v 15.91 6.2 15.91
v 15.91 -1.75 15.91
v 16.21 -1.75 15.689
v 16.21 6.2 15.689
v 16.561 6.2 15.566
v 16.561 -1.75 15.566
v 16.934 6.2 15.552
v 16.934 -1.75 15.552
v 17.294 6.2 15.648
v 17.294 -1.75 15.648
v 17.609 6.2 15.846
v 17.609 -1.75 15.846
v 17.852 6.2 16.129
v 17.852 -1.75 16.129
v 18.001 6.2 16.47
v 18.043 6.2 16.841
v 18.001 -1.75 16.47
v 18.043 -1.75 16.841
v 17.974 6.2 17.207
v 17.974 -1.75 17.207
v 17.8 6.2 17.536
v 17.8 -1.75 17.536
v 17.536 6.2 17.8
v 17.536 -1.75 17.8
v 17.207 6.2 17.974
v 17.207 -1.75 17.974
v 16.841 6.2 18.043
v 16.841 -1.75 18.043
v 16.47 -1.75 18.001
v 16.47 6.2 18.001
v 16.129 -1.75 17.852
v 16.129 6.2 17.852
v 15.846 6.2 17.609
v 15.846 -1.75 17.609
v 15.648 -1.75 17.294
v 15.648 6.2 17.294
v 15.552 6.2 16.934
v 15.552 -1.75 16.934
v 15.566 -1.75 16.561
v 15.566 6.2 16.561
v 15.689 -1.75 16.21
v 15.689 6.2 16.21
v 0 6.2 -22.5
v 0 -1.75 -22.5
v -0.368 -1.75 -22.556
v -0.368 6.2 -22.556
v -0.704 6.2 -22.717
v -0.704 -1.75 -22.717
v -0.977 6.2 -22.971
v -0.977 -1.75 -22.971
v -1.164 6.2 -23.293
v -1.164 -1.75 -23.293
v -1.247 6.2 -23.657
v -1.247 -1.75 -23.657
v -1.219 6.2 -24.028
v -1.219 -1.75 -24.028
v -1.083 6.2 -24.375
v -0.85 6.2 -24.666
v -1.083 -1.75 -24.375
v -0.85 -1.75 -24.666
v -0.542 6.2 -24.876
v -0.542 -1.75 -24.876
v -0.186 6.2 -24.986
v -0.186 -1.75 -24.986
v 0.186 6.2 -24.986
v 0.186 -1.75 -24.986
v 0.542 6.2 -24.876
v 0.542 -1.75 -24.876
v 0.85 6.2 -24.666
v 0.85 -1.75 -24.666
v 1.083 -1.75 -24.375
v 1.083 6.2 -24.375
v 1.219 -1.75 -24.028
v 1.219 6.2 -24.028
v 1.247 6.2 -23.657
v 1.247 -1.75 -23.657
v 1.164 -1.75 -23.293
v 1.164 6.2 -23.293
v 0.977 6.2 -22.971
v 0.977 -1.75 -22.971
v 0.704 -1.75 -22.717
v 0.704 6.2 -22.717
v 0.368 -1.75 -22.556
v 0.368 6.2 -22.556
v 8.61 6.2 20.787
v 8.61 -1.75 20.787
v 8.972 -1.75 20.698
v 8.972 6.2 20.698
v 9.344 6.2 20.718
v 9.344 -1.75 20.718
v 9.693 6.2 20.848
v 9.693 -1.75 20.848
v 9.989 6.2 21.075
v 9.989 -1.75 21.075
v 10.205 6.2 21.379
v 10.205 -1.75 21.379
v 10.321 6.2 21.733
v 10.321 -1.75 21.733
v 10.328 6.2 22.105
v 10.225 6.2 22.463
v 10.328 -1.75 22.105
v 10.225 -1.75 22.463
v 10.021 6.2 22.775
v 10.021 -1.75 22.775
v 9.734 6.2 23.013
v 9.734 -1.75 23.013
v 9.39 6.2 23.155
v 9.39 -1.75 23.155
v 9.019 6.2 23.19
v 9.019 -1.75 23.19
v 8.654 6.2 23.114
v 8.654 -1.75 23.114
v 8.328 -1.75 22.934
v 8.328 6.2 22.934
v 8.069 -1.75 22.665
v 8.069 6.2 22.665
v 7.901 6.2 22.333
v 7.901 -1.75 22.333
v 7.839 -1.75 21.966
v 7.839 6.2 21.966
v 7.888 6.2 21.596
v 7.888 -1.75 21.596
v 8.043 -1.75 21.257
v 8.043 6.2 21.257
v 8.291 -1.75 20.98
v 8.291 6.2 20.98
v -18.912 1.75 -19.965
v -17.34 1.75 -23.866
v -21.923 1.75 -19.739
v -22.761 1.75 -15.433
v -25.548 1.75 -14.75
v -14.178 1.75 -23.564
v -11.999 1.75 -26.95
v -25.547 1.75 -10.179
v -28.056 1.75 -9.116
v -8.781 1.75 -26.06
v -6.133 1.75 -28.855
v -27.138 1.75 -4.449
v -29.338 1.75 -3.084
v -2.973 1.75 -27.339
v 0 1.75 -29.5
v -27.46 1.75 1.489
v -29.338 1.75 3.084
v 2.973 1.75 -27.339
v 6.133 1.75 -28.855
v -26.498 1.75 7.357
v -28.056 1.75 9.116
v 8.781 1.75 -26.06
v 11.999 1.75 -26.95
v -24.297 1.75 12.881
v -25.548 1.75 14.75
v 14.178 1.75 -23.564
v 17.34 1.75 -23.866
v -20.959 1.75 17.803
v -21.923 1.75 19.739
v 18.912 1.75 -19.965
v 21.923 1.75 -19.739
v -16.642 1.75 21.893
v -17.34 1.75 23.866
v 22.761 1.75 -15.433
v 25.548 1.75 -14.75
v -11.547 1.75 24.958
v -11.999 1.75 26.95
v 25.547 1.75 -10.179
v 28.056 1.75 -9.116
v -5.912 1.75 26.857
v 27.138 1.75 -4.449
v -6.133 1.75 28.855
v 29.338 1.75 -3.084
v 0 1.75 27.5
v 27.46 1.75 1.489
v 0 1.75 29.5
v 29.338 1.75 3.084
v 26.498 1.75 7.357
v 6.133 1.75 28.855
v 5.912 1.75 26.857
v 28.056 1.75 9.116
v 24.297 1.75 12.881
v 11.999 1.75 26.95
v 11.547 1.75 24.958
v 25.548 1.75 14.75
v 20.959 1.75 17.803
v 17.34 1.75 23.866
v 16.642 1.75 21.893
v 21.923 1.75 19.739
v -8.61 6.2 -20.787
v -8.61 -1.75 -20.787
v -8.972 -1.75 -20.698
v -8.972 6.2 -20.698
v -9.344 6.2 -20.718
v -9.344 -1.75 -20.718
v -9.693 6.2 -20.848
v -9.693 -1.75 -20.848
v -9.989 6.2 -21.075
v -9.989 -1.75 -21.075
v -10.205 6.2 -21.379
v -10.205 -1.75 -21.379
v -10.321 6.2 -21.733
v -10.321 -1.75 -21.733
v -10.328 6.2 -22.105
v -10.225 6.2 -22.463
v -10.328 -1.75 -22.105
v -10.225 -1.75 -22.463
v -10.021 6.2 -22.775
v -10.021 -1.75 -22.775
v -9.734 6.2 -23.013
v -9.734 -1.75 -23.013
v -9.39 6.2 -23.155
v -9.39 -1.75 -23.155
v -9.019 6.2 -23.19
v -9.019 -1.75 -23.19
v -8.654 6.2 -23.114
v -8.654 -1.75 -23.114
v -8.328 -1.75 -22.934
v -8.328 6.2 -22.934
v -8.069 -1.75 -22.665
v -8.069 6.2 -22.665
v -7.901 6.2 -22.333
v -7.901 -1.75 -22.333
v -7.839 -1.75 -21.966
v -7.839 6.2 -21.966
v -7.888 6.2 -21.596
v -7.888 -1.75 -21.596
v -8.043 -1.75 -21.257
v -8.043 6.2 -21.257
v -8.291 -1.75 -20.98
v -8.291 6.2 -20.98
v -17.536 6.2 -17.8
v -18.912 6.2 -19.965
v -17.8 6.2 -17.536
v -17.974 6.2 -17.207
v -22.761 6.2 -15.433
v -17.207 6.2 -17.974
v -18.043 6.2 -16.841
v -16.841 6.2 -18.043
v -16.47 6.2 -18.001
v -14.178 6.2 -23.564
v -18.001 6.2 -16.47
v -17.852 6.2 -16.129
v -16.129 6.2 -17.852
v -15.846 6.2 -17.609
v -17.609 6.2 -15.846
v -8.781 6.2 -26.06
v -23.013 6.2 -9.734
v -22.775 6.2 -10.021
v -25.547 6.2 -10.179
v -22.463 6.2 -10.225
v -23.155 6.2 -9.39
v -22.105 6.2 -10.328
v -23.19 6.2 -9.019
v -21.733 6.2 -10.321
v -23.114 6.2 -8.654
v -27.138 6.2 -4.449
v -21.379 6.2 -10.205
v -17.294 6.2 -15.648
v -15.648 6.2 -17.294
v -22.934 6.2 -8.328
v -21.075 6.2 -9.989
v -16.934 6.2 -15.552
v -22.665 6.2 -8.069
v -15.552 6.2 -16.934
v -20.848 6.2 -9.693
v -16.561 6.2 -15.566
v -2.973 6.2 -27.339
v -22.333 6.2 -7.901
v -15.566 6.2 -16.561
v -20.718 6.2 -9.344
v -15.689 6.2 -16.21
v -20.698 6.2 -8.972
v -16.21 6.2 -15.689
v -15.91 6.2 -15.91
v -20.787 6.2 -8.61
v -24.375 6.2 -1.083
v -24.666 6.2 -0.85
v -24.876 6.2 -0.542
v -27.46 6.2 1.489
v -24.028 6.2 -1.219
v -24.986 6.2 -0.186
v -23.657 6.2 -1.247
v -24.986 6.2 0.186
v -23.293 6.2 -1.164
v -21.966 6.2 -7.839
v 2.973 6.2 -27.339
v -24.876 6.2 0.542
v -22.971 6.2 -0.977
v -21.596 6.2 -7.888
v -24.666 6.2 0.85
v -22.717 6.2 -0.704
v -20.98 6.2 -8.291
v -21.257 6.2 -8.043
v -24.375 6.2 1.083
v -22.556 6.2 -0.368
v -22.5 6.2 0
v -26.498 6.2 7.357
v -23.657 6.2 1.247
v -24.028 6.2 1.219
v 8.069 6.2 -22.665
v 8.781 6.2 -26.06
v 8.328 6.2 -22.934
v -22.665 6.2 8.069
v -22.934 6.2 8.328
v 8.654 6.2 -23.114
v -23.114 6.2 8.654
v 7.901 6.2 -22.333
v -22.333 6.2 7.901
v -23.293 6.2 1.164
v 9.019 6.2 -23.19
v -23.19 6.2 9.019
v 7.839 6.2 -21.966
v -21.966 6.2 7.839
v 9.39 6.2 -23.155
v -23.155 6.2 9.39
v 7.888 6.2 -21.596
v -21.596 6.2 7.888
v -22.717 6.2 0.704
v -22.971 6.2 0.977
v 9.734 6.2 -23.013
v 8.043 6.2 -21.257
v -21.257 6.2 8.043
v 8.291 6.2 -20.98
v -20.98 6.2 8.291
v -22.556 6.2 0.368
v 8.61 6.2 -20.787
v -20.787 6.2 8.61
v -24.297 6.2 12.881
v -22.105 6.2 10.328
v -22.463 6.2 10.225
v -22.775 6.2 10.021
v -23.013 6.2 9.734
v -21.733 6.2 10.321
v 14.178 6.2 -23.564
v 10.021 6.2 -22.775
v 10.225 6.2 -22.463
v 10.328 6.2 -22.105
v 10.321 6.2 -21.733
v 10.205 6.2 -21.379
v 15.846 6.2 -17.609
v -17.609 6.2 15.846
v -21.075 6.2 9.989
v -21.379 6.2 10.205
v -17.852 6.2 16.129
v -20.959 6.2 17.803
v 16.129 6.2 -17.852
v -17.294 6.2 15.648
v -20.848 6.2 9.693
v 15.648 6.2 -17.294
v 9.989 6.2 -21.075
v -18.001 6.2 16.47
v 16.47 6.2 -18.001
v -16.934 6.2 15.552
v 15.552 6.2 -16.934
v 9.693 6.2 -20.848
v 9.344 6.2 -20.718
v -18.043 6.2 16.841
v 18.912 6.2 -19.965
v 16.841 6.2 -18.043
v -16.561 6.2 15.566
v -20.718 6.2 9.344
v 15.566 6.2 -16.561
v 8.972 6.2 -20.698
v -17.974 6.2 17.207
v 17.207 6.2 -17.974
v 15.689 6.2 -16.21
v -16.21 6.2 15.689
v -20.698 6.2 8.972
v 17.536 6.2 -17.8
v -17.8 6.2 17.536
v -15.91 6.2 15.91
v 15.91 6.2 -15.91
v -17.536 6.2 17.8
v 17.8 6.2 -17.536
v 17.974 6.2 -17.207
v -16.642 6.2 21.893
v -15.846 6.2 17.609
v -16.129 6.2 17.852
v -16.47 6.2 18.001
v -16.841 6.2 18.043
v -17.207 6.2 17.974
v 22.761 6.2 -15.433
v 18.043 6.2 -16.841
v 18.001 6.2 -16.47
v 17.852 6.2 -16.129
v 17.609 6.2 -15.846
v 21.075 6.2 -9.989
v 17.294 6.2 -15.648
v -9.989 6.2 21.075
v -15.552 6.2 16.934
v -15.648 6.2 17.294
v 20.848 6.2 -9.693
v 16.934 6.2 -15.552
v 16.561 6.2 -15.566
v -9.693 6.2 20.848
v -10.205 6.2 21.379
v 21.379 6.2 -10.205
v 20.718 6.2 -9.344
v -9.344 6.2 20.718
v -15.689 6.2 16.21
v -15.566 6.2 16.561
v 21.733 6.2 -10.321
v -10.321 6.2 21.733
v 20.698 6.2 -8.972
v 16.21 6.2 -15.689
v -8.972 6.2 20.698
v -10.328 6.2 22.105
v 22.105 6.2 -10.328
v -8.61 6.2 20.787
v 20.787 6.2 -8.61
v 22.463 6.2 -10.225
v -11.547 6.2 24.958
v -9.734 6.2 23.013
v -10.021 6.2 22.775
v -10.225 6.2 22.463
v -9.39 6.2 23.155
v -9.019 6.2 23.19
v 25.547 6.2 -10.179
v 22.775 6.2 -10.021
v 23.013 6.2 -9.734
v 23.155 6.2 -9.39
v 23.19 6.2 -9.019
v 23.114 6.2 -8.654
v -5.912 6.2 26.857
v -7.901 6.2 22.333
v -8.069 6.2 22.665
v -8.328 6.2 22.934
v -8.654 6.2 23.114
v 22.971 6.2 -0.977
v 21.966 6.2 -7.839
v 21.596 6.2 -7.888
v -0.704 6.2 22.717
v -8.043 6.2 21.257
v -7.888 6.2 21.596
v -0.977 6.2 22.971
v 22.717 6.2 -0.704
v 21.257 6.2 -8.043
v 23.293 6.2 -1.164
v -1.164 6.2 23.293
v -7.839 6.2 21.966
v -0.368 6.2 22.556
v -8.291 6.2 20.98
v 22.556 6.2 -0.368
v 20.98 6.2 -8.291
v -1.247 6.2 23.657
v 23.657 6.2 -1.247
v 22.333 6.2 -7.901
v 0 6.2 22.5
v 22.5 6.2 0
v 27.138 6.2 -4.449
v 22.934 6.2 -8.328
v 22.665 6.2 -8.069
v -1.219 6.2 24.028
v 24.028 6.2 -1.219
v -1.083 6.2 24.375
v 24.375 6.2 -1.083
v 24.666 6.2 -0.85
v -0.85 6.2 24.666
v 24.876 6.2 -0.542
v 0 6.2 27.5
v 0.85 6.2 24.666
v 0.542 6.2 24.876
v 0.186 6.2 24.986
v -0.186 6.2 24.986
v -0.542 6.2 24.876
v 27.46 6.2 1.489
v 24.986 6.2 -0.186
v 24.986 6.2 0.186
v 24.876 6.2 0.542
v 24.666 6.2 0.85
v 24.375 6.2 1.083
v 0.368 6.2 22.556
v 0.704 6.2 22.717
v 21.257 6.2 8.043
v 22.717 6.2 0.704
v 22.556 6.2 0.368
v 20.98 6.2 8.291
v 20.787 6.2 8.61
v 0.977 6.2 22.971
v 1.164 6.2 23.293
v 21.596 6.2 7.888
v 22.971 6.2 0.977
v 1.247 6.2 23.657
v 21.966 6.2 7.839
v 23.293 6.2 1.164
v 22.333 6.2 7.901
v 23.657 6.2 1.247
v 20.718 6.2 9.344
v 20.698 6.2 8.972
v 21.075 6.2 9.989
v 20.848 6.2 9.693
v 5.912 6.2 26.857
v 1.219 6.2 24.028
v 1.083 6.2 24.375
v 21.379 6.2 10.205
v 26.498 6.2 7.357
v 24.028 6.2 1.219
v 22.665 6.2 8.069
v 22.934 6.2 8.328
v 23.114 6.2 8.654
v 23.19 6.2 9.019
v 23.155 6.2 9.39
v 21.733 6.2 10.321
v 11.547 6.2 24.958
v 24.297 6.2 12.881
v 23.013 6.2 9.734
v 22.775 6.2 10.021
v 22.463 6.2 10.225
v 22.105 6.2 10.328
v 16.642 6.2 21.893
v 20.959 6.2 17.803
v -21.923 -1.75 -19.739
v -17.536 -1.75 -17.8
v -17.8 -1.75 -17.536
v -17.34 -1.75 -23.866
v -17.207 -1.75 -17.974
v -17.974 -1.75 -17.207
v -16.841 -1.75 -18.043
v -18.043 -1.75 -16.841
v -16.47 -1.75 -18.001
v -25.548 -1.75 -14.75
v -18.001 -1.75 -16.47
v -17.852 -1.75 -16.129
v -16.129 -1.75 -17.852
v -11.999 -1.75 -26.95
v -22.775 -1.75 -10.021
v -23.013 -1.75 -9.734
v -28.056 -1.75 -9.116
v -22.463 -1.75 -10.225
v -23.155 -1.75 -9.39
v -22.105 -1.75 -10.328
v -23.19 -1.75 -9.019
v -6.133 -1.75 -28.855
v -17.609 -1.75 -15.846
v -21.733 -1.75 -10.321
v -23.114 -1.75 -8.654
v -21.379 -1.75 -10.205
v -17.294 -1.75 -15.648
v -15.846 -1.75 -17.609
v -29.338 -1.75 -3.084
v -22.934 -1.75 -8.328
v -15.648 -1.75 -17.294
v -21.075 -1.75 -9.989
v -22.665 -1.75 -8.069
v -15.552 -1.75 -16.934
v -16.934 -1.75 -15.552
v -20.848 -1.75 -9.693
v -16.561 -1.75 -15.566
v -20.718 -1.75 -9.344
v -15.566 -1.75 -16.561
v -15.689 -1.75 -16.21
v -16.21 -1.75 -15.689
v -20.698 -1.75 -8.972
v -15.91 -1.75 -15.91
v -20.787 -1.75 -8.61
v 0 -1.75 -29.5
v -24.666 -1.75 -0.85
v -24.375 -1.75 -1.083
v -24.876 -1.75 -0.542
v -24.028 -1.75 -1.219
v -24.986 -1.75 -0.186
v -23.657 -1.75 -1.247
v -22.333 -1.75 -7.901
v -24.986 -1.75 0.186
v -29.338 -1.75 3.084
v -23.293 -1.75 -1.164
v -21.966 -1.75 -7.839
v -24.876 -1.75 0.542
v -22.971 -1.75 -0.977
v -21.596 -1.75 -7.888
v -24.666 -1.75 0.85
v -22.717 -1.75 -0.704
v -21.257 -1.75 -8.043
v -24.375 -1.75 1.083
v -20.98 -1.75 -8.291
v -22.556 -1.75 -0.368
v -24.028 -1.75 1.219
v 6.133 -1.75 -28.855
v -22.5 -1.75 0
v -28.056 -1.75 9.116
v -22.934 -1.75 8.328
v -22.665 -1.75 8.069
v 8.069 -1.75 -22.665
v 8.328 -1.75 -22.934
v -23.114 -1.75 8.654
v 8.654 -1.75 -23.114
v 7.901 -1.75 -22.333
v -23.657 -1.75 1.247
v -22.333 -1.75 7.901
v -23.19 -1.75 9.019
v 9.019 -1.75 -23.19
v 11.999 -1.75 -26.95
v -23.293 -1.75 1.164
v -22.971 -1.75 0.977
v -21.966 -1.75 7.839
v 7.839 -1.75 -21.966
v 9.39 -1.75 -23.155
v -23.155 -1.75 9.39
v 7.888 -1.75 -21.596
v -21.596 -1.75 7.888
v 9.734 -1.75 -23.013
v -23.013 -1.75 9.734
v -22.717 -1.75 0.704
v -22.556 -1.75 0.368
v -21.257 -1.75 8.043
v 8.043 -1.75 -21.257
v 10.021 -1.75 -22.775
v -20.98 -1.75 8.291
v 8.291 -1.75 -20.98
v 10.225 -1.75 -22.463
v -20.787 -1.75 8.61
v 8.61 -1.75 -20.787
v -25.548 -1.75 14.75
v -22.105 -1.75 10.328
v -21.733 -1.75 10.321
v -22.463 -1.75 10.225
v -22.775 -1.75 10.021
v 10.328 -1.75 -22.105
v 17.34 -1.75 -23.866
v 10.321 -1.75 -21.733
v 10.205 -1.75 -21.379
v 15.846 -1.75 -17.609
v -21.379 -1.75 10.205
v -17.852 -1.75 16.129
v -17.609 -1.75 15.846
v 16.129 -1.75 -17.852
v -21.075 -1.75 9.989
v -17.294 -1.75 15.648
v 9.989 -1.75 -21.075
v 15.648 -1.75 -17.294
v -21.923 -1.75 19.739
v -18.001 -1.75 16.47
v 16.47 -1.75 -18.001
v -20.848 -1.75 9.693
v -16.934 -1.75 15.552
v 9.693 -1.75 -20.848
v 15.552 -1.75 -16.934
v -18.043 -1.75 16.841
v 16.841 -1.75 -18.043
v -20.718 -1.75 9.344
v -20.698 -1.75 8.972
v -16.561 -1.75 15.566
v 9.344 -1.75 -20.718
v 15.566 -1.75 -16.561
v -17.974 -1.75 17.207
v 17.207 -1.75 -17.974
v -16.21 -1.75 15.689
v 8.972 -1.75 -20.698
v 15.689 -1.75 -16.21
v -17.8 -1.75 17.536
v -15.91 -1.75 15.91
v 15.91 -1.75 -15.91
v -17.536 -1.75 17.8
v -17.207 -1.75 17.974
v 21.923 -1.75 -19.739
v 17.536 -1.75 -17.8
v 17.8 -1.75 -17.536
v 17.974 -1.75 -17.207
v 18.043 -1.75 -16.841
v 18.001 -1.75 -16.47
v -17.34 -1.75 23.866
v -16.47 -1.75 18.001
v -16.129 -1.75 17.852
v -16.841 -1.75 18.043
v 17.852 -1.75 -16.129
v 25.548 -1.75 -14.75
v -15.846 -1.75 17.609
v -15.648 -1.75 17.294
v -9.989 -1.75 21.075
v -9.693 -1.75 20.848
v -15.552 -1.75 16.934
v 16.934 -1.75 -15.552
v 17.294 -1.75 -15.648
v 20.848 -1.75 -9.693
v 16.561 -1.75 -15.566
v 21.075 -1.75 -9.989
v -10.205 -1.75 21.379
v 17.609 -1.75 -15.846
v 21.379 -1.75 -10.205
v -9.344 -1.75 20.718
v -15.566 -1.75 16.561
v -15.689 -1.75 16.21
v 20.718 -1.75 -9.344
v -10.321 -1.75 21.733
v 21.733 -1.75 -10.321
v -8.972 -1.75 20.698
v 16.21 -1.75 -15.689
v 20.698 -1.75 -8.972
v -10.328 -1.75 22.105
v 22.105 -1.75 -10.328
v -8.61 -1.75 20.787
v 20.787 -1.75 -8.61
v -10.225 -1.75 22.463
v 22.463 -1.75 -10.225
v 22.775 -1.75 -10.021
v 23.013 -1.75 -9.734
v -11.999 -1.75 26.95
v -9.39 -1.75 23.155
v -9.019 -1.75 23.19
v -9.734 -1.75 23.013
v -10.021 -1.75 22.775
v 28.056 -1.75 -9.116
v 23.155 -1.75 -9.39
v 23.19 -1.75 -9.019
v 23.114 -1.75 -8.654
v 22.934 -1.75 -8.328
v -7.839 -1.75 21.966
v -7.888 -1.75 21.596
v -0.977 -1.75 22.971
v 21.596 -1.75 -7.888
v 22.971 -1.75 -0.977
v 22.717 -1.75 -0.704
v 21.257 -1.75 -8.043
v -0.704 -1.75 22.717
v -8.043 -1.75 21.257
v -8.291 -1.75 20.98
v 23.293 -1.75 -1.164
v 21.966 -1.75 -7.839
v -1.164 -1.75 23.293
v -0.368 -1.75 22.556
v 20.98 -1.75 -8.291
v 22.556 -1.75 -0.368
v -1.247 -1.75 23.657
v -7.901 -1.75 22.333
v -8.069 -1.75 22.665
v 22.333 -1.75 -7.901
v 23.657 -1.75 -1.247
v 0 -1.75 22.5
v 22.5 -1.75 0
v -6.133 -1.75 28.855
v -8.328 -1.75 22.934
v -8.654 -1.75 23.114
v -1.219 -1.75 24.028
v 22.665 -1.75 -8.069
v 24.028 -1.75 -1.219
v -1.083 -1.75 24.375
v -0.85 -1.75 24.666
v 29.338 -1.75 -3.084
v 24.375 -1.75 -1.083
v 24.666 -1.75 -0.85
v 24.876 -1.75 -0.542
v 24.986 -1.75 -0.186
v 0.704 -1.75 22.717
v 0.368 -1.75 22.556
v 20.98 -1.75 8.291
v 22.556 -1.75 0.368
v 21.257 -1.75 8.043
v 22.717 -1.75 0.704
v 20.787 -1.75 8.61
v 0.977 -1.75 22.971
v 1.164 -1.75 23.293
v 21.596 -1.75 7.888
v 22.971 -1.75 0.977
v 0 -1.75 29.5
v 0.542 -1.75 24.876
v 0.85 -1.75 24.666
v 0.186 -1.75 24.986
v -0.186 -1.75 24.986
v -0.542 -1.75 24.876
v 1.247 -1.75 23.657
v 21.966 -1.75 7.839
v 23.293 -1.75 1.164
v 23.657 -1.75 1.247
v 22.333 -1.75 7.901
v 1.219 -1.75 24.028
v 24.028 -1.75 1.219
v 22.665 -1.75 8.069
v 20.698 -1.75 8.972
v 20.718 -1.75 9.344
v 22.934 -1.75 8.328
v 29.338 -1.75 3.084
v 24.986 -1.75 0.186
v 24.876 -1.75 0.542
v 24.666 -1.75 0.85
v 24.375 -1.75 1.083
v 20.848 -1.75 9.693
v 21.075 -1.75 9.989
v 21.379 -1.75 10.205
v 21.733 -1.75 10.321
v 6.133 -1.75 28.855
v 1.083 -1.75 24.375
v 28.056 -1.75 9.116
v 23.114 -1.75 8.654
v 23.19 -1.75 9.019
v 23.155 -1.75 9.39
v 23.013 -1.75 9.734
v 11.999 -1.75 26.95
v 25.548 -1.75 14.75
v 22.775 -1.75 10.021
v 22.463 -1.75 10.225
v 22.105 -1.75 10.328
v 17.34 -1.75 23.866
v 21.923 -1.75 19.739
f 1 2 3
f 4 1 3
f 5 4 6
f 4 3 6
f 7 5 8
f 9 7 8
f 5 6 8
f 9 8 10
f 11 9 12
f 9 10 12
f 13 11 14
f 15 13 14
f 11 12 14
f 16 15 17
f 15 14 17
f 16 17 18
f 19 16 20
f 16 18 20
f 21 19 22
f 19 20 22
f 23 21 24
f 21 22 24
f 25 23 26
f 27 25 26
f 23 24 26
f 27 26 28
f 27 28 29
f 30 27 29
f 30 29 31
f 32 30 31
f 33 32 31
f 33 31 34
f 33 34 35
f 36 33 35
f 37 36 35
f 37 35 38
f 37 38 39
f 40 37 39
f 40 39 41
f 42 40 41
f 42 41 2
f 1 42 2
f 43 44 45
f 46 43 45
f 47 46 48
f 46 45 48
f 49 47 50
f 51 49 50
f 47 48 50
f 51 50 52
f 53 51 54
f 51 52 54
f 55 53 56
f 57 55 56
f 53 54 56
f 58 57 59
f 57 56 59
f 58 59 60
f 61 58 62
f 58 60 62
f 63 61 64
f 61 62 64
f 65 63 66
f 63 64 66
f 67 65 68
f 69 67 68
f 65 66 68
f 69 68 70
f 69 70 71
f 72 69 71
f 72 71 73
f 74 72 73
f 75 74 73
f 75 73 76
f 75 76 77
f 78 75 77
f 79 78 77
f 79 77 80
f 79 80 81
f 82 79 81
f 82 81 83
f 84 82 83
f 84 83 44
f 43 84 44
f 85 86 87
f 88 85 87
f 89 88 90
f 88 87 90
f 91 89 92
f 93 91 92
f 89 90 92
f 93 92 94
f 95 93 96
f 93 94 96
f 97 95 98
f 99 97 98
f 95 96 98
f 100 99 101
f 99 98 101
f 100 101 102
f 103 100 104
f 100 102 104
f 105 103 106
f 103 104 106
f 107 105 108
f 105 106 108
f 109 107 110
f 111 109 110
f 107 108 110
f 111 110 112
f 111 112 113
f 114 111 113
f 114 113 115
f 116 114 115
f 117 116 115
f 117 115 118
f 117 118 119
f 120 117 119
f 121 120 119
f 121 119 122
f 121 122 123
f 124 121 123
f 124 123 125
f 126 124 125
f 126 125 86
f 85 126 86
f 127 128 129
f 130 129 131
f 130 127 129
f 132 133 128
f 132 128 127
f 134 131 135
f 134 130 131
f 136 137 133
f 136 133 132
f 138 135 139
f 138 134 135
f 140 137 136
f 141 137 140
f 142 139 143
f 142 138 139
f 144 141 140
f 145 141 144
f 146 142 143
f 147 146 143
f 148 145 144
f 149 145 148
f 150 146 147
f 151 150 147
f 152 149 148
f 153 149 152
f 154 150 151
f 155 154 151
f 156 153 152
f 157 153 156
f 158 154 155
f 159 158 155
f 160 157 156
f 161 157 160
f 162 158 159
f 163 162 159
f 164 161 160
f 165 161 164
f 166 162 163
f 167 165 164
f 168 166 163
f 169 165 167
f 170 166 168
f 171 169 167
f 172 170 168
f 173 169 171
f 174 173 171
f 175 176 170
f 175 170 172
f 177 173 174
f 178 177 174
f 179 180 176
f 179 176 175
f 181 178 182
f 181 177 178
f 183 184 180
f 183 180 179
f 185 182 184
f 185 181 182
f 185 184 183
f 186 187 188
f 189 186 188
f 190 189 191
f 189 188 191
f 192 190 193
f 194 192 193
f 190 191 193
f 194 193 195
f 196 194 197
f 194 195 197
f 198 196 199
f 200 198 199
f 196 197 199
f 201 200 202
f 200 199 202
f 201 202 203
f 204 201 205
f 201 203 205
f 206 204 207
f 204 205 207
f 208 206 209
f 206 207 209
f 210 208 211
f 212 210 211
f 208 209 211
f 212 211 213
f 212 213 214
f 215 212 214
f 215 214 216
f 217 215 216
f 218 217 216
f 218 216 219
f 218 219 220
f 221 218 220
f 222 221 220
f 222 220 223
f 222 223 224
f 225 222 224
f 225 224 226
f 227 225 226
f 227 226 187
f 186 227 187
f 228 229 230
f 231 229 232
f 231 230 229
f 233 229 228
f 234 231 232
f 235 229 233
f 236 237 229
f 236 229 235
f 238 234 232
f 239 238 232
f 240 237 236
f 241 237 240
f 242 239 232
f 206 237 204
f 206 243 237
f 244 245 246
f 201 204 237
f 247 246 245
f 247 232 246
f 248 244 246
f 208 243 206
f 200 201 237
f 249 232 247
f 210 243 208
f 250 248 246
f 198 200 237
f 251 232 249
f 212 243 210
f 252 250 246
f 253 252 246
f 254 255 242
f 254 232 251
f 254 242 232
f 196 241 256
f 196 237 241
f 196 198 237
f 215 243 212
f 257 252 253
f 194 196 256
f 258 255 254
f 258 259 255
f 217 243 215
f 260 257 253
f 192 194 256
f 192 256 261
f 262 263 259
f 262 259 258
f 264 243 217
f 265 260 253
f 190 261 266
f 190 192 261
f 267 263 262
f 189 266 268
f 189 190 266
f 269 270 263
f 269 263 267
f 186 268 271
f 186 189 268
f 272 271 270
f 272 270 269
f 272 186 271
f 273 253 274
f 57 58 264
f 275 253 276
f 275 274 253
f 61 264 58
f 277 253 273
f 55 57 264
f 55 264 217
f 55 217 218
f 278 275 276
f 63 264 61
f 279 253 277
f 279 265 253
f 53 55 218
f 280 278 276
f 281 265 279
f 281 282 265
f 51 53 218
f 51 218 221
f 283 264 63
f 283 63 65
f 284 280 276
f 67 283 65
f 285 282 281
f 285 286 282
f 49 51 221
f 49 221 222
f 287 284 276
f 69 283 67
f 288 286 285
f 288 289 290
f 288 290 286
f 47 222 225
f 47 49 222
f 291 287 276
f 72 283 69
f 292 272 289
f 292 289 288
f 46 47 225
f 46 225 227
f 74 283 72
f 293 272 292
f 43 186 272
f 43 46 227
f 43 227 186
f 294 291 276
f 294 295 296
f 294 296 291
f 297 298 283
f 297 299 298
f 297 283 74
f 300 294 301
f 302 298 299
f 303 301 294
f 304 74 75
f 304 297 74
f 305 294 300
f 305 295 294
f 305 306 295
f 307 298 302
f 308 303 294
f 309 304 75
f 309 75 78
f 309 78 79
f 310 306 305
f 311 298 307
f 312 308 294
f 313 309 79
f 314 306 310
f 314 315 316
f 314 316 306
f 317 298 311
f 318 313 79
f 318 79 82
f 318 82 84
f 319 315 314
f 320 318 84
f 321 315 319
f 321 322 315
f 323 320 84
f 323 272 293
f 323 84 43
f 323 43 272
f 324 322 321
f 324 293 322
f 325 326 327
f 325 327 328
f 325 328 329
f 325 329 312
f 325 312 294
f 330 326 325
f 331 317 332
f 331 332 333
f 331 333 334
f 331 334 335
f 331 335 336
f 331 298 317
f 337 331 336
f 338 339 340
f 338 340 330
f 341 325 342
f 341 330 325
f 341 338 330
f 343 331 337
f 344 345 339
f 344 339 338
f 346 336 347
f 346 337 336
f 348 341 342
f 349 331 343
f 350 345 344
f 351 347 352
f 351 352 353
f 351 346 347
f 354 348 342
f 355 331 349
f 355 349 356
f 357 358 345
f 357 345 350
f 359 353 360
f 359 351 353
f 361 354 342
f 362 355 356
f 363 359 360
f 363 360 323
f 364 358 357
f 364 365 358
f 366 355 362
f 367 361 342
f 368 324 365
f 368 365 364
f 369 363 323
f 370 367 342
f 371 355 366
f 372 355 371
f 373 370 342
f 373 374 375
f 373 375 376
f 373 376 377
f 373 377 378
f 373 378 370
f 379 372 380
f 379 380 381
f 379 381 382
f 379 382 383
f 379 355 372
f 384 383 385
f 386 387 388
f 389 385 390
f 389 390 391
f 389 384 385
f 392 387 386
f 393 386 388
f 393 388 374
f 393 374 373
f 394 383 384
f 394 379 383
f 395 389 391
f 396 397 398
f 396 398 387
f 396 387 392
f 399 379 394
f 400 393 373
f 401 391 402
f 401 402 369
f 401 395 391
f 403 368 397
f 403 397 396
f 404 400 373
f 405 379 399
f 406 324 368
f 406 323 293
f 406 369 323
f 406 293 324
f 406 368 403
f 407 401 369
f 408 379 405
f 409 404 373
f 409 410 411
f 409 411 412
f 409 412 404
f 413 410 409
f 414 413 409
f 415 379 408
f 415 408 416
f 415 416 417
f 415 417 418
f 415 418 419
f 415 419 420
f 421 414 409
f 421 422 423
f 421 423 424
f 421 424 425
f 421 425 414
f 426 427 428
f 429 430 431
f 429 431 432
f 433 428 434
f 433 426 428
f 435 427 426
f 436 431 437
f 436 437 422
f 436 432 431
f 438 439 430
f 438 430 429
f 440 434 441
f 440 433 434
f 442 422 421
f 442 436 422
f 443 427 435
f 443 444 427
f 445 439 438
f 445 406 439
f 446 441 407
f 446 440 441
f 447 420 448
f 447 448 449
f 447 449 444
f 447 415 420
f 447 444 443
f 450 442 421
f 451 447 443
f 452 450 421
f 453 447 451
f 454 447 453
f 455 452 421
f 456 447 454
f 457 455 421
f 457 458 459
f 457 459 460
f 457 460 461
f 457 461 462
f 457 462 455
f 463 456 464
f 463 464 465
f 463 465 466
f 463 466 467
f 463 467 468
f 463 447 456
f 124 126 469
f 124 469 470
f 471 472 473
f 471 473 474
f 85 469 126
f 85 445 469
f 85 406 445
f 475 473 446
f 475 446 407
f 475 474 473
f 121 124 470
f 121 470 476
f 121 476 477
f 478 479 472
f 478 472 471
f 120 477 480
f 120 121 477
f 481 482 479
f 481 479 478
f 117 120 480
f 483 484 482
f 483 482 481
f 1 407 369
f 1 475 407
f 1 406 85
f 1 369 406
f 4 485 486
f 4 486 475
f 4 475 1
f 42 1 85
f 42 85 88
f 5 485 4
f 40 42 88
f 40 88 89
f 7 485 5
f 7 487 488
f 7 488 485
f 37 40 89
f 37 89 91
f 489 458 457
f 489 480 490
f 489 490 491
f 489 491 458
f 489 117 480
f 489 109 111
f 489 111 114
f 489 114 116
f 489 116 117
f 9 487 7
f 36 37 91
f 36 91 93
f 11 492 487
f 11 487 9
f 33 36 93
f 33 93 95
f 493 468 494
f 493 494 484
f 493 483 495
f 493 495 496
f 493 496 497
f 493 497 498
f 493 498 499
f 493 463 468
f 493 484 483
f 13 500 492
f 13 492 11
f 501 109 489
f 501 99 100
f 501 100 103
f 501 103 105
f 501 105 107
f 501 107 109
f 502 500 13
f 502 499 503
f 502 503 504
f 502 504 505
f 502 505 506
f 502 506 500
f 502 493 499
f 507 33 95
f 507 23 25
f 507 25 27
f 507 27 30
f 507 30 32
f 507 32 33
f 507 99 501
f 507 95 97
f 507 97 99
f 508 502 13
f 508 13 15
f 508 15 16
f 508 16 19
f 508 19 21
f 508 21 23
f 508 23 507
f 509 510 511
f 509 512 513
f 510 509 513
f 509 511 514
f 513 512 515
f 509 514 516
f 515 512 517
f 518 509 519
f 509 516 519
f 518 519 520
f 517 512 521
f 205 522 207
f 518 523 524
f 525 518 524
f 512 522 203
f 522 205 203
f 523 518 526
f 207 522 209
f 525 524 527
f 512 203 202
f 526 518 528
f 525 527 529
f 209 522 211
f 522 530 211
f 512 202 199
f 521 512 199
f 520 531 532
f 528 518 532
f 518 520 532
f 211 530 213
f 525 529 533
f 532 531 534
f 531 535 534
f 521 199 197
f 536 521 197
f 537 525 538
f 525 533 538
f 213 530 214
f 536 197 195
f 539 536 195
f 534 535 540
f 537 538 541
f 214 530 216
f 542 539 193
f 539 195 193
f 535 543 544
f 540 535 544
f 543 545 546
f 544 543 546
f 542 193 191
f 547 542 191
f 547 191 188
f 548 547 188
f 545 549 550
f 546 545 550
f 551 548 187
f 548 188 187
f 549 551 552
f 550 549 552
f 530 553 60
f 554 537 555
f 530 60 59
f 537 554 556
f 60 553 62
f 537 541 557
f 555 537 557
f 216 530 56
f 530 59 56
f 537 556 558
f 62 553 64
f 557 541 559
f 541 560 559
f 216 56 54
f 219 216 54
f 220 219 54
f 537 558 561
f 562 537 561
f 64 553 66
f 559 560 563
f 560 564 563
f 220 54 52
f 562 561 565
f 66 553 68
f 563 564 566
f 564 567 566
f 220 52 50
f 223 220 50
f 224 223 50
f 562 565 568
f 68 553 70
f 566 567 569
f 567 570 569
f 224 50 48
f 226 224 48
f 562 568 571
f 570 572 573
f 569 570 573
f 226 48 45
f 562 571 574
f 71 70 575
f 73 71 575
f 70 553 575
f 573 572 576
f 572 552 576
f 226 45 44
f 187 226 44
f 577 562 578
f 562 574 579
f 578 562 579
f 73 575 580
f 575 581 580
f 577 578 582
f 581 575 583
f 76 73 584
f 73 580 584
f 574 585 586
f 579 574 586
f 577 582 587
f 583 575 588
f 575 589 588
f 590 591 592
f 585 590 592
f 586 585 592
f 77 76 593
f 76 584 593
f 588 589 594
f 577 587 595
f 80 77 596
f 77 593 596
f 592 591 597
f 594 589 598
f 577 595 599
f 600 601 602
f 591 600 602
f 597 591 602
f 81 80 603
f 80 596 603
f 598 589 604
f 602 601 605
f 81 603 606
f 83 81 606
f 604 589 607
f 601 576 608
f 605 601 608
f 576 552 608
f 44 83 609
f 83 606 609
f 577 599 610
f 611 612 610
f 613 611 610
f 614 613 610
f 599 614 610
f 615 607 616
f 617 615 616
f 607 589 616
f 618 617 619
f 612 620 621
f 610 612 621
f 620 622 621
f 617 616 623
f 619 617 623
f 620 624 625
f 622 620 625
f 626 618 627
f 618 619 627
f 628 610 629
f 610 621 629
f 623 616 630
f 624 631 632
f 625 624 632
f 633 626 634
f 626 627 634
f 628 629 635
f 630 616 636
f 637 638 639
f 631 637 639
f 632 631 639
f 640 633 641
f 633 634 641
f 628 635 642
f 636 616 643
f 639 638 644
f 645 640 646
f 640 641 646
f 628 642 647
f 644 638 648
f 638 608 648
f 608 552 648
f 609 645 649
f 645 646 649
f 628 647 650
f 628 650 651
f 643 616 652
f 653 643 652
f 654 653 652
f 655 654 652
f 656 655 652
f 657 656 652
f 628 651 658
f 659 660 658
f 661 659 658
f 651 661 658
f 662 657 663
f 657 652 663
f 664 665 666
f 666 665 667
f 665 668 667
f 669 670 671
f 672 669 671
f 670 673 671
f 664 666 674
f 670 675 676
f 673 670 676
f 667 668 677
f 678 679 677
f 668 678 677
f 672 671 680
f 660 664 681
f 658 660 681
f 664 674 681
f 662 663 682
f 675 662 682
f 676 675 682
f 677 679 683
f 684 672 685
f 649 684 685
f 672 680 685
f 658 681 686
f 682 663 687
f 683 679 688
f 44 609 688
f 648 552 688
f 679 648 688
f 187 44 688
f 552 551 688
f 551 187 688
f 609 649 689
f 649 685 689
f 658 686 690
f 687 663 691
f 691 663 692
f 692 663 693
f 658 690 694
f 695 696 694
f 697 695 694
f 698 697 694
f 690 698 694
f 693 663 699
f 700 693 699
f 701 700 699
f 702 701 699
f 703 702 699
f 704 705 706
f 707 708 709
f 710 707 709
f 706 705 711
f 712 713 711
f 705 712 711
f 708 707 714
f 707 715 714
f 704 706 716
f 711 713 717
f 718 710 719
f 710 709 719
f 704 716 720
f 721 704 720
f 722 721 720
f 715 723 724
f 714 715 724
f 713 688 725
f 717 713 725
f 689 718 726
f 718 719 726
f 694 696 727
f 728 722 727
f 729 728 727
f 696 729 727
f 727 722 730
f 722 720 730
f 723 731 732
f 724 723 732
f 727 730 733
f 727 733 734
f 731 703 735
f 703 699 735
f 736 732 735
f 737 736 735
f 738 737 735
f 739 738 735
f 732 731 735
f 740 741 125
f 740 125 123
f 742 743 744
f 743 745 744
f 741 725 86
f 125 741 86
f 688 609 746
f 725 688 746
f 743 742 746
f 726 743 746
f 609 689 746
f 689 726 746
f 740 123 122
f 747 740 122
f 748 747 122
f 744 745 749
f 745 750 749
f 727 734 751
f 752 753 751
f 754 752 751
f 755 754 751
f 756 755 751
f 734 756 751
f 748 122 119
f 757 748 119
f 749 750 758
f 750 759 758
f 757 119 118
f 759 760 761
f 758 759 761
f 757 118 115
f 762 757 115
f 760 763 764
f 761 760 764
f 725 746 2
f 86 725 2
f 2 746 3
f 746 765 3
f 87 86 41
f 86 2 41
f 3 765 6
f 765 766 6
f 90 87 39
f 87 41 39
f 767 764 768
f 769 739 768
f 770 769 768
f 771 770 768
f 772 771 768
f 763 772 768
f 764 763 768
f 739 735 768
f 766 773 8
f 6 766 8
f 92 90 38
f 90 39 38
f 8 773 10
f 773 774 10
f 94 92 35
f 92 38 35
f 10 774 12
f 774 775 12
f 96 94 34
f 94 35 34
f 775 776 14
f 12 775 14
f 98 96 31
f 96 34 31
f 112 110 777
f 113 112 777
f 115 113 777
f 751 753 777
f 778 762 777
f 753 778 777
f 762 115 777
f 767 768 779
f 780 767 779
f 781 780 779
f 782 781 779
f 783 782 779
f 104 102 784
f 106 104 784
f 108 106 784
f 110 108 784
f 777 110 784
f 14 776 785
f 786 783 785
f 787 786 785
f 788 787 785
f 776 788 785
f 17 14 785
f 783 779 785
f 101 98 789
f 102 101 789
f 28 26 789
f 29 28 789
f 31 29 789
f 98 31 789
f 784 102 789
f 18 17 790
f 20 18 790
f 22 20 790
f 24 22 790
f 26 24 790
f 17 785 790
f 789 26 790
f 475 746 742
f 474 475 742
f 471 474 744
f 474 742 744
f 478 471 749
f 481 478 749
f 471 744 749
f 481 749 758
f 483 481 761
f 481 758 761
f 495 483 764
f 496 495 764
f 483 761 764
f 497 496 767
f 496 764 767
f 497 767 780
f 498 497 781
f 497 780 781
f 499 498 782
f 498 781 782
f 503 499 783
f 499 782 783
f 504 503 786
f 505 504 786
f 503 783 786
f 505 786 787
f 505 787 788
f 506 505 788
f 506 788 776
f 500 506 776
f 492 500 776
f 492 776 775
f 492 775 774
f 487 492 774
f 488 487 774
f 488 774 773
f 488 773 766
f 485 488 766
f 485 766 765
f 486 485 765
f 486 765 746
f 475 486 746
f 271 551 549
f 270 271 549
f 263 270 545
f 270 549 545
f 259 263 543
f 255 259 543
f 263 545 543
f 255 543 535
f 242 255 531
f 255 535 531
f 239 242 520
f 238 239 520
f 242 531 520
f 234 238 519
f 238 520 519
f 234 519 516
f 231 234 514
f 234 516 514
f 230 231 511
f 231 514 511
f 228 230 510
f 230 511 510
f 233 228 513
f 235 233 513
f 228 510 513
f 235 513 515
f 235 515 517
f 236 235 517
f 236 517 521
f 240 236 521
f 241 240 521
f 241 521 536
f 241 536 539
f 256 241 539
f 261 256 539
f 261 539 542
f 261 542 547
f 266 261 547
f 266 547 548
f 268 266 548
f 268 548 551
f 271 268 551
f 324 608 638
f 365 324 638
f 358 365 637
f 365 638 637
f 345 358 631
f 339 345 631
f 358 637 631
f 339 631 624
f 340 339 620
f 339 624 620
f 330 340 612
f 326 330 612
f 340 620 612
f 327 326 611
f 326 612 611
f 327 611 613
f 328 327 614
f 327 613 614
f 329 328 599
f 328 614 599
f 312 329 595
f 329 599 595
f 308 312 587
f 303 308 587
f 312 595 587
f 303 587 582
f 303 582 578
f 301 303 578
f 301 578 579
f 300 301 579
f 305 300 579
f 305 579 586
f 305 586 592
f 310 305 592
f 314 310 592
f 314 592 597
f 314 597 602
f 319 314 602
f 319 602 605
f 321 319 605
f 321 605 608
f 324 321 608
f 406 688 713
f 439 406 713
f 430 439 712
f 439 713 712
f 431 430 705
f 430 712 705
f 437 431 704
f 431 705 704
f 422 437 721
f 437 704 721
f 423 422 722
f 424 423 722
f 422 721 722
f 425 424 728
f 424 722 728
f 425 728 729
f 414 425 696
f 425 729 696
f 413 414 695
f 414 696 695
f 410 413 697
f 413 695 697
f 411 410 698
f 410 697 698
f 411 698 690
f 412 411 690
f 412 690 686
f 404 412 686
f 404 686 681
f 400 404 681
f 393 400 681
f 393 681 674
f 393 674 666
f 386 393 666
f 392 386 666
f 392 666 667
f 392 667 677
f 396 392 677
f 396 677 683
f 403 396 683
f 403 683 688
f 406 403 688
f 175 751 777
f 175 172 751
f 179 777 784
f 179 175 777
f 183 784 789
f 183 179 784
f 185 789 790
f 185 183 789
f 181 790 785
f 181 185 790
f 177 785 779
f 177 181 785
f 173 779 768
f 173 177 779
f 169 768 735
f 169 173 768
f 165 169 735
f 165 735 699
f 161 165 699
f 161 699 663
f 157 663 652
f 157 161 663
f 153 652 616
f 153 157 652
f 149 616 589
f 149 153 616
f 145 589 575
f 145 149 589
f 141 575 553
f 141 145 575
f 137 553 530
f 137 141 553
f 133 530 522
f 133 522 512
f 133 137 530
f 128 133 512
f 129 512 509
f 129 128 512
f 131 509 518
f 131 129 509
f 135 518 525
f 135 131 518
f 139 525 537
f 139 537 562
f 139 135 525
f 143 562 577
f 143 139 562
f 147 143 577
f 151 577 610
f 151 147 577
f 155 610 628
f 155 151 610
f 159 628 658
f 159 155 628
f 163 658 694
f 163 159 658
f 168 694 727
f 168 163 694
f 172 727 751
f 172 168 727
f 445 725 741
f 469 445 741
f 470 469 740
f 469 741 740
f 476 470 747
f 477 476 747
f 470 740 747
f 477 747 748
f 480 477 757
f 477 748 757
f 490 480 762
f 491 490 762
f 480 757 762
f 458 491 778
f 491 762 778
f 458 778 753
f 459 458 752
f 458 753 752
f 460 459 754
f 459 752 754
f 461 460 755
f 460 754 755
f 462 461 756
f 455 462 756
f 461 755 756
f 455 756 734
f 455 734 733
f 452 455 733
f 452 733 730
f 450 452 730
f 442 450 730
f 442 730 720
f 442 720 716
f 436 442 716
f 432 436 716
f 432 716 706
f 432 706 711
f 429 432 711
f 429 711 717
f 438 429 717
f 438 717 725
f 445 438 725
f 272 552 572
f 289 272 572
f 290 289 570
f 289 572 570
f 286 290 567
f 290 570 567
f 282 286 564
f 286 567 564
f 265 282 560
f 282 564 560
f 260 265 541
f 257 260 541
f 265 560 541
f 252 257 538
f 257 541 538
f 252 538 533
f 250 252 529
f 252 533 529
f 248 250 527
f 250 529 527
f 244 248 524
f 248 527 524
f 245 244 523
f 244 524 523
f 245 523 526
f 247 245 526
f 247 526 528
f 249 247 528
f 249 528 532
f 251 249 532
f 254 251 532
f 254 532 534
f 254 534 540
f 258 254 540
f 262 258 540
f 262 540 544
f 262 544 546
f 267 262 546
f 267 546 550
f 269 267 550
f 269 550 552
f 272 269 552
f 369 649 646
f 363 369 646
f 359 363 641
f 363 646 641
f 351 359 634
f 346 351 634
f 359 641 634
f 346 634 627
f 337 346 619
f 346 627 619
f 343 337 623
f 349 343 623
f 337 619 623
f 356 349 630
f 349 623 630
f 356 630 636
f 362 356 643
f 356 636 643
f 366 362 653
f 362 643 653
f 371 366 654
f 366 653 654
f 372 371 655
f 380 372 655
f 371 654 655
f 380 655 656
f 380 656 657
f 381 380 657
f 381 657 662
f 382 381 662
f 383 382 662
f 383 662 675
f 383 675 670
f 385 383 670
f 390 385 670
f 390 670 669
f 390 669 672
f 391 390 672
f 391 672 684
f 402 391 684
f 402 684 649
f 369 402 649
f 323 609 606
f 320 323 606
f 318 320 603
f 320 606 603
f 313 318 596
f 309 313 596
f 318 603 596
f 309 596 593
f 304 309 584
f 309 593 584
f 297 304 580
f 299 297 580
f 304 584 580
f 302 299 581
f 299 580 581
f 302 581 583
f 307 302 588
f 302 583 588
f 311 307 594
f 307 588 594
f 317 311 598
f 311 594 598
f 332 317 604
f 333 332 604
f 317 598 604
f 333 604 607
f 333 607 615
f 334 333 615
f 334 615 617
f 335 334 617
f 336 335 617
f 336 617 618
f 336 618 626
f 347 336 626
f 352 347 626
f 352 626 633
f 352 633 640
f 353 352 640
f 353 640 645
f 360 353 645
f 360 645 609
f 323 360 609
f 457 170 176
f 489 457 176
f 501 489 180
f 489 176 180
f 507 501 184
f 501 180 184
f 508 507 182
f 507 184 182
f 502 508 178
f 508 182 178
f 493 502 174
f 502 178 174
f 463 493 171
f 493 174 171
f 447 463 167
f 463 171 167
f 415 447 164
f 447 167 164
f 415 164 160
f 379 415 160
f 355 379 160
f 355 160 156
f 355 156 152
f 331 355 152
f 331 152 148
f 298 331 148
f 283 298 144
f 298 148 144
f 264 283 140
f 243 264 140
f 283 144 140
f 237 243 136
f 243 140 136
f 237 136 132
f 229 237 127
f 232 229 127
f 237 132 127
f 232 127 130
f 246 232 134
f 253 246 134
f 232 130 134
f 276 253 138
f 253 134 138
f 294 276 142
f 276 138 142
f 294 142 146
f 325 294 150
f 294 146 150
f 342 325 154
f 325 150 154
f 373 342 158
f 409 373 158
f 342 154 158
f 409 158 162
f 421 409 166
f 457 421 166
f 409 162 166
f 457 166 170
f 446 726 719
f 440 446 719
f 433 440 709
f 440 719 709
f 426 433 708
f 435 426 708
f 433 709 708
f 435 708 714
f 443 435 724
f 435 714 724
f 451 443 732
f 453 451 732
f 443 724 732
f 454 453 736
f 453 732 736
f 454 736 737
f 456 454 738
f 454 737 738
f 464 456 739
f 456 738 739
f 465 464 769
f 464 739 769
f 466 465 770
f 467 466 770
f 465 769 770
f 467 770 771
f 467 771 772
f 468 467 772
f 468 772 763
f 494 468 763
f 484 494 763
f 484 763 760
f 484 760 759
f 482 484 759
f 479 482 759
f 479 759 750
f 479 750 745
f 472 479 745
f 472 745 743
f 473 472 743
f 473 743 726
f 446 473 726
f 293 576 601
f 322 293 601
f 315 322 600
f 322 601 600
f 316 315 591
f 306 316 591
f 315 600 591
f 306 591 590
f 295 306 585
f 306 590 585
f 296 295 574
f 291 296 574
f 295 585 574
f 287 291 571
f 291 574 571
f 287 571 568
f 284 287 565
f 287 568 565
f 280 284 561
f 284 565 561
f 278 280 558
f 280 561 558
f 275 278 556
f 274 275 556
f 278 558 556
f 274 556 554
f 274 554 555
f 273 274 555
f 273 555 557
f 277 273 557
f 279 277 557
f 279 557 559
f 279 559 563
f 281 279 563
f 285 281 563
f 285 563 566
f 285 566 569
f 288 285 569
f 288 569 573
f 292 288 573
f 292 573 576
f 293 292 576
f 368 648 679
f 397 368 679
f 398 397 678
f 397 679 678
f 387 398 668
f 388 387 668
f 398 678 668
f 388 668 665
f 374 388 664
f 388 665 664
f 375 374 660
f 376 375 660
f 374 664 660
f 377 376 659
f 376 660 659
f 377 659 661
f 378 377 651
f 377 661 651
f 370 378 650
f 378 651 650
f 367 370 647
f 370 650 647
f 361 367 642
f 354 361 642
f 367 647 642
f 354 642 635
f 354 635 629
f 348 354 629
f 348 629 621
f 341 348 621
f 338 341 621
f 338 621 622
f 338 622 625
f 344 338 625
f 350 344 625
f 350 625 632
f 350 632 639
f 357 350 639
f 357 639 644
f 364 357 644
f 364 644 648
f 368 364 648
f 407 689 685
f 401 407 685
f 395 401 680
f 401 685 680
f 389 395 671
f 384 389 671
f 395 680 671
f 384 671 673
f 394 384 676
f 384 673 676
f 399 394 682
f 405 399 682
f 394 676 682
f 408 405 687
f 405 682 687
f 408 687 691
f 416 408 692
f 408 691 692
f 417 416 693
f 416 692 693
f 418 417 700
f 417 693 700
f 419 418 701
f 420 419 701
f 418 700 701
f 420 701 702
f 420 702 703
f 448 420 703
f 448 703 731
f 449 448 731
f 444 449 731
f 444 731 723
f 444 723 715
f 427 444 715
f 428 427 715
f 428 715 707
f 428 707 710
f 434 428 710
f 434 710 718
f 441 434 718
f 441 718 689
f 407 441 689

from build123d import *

# Parameters (mm, degrees)
SKETCH1_R           = 29.5
BOSS_EXTRUDE1_DEPTH = 1.75
SKETCH2_R           = 27.5
BOSS_EXTRUDE2_DEPTH = 4.45
SKETCH3_R           = 1.25
CUT_EXTRUDE1_DEPTH  = 43.470018837
CIRPATTERN1_COUNT   = 16


with BuildPart() as part:
    # Sketch1 → Boss-Extrude1 (new, symmetric)
    with BuildSketch(Plane(origin=(0, 0, 0), x_dir=(1, 0, 0), z_dir=(0, 1, 0))):
        with Locations(Location((0, 0, 0), (0, 0, 270))):
            Circle(SKETCH1_R)
    extrude(amount=BOSS_EXTRUDE1_DEPTH, both=True)

    # Sketch2 → Boss-Extrude2 (add)
    with BuildSketch(Plane(origin=(0, 1.75, 0), x_dir=(1, 0, 0), z_dir=(0, 1, 0))):
        with Locations(Location((0, 0, 0), (0, 0, 270))):
            Circle(SKETCH2_R)
    extrude(amount=BOSS_EXTRUDE2_DEPTH)

    # Sketch3 → Cut-Extrude1 (cut, through all)
    with BuildSketch(Plane.XZ.offset(1.75)):
        with Locations(Location((0, 23.75, 0), (0, 0, 270))):
            Circle(SKETCH3_R)
    cut_extrude1 = extrude(amount=-CUT_EXTRUDE1_DEPTH, mode=Mode.SUBTRACT)

    # CirPattern1: Cut-Extrude1 ×16 about axis
    cirpattern1_axis = Axis((0, 0, 0), (0, 1, 0))
    for i in range(1, CIRPATTERN1_COUNT):
        add(cut_extrude1.rotate(cirpattern1_axis, i * 360 / CIRPATTERN1_COUNT), mode=Mode.SUBTRACT)


solid = part.part
